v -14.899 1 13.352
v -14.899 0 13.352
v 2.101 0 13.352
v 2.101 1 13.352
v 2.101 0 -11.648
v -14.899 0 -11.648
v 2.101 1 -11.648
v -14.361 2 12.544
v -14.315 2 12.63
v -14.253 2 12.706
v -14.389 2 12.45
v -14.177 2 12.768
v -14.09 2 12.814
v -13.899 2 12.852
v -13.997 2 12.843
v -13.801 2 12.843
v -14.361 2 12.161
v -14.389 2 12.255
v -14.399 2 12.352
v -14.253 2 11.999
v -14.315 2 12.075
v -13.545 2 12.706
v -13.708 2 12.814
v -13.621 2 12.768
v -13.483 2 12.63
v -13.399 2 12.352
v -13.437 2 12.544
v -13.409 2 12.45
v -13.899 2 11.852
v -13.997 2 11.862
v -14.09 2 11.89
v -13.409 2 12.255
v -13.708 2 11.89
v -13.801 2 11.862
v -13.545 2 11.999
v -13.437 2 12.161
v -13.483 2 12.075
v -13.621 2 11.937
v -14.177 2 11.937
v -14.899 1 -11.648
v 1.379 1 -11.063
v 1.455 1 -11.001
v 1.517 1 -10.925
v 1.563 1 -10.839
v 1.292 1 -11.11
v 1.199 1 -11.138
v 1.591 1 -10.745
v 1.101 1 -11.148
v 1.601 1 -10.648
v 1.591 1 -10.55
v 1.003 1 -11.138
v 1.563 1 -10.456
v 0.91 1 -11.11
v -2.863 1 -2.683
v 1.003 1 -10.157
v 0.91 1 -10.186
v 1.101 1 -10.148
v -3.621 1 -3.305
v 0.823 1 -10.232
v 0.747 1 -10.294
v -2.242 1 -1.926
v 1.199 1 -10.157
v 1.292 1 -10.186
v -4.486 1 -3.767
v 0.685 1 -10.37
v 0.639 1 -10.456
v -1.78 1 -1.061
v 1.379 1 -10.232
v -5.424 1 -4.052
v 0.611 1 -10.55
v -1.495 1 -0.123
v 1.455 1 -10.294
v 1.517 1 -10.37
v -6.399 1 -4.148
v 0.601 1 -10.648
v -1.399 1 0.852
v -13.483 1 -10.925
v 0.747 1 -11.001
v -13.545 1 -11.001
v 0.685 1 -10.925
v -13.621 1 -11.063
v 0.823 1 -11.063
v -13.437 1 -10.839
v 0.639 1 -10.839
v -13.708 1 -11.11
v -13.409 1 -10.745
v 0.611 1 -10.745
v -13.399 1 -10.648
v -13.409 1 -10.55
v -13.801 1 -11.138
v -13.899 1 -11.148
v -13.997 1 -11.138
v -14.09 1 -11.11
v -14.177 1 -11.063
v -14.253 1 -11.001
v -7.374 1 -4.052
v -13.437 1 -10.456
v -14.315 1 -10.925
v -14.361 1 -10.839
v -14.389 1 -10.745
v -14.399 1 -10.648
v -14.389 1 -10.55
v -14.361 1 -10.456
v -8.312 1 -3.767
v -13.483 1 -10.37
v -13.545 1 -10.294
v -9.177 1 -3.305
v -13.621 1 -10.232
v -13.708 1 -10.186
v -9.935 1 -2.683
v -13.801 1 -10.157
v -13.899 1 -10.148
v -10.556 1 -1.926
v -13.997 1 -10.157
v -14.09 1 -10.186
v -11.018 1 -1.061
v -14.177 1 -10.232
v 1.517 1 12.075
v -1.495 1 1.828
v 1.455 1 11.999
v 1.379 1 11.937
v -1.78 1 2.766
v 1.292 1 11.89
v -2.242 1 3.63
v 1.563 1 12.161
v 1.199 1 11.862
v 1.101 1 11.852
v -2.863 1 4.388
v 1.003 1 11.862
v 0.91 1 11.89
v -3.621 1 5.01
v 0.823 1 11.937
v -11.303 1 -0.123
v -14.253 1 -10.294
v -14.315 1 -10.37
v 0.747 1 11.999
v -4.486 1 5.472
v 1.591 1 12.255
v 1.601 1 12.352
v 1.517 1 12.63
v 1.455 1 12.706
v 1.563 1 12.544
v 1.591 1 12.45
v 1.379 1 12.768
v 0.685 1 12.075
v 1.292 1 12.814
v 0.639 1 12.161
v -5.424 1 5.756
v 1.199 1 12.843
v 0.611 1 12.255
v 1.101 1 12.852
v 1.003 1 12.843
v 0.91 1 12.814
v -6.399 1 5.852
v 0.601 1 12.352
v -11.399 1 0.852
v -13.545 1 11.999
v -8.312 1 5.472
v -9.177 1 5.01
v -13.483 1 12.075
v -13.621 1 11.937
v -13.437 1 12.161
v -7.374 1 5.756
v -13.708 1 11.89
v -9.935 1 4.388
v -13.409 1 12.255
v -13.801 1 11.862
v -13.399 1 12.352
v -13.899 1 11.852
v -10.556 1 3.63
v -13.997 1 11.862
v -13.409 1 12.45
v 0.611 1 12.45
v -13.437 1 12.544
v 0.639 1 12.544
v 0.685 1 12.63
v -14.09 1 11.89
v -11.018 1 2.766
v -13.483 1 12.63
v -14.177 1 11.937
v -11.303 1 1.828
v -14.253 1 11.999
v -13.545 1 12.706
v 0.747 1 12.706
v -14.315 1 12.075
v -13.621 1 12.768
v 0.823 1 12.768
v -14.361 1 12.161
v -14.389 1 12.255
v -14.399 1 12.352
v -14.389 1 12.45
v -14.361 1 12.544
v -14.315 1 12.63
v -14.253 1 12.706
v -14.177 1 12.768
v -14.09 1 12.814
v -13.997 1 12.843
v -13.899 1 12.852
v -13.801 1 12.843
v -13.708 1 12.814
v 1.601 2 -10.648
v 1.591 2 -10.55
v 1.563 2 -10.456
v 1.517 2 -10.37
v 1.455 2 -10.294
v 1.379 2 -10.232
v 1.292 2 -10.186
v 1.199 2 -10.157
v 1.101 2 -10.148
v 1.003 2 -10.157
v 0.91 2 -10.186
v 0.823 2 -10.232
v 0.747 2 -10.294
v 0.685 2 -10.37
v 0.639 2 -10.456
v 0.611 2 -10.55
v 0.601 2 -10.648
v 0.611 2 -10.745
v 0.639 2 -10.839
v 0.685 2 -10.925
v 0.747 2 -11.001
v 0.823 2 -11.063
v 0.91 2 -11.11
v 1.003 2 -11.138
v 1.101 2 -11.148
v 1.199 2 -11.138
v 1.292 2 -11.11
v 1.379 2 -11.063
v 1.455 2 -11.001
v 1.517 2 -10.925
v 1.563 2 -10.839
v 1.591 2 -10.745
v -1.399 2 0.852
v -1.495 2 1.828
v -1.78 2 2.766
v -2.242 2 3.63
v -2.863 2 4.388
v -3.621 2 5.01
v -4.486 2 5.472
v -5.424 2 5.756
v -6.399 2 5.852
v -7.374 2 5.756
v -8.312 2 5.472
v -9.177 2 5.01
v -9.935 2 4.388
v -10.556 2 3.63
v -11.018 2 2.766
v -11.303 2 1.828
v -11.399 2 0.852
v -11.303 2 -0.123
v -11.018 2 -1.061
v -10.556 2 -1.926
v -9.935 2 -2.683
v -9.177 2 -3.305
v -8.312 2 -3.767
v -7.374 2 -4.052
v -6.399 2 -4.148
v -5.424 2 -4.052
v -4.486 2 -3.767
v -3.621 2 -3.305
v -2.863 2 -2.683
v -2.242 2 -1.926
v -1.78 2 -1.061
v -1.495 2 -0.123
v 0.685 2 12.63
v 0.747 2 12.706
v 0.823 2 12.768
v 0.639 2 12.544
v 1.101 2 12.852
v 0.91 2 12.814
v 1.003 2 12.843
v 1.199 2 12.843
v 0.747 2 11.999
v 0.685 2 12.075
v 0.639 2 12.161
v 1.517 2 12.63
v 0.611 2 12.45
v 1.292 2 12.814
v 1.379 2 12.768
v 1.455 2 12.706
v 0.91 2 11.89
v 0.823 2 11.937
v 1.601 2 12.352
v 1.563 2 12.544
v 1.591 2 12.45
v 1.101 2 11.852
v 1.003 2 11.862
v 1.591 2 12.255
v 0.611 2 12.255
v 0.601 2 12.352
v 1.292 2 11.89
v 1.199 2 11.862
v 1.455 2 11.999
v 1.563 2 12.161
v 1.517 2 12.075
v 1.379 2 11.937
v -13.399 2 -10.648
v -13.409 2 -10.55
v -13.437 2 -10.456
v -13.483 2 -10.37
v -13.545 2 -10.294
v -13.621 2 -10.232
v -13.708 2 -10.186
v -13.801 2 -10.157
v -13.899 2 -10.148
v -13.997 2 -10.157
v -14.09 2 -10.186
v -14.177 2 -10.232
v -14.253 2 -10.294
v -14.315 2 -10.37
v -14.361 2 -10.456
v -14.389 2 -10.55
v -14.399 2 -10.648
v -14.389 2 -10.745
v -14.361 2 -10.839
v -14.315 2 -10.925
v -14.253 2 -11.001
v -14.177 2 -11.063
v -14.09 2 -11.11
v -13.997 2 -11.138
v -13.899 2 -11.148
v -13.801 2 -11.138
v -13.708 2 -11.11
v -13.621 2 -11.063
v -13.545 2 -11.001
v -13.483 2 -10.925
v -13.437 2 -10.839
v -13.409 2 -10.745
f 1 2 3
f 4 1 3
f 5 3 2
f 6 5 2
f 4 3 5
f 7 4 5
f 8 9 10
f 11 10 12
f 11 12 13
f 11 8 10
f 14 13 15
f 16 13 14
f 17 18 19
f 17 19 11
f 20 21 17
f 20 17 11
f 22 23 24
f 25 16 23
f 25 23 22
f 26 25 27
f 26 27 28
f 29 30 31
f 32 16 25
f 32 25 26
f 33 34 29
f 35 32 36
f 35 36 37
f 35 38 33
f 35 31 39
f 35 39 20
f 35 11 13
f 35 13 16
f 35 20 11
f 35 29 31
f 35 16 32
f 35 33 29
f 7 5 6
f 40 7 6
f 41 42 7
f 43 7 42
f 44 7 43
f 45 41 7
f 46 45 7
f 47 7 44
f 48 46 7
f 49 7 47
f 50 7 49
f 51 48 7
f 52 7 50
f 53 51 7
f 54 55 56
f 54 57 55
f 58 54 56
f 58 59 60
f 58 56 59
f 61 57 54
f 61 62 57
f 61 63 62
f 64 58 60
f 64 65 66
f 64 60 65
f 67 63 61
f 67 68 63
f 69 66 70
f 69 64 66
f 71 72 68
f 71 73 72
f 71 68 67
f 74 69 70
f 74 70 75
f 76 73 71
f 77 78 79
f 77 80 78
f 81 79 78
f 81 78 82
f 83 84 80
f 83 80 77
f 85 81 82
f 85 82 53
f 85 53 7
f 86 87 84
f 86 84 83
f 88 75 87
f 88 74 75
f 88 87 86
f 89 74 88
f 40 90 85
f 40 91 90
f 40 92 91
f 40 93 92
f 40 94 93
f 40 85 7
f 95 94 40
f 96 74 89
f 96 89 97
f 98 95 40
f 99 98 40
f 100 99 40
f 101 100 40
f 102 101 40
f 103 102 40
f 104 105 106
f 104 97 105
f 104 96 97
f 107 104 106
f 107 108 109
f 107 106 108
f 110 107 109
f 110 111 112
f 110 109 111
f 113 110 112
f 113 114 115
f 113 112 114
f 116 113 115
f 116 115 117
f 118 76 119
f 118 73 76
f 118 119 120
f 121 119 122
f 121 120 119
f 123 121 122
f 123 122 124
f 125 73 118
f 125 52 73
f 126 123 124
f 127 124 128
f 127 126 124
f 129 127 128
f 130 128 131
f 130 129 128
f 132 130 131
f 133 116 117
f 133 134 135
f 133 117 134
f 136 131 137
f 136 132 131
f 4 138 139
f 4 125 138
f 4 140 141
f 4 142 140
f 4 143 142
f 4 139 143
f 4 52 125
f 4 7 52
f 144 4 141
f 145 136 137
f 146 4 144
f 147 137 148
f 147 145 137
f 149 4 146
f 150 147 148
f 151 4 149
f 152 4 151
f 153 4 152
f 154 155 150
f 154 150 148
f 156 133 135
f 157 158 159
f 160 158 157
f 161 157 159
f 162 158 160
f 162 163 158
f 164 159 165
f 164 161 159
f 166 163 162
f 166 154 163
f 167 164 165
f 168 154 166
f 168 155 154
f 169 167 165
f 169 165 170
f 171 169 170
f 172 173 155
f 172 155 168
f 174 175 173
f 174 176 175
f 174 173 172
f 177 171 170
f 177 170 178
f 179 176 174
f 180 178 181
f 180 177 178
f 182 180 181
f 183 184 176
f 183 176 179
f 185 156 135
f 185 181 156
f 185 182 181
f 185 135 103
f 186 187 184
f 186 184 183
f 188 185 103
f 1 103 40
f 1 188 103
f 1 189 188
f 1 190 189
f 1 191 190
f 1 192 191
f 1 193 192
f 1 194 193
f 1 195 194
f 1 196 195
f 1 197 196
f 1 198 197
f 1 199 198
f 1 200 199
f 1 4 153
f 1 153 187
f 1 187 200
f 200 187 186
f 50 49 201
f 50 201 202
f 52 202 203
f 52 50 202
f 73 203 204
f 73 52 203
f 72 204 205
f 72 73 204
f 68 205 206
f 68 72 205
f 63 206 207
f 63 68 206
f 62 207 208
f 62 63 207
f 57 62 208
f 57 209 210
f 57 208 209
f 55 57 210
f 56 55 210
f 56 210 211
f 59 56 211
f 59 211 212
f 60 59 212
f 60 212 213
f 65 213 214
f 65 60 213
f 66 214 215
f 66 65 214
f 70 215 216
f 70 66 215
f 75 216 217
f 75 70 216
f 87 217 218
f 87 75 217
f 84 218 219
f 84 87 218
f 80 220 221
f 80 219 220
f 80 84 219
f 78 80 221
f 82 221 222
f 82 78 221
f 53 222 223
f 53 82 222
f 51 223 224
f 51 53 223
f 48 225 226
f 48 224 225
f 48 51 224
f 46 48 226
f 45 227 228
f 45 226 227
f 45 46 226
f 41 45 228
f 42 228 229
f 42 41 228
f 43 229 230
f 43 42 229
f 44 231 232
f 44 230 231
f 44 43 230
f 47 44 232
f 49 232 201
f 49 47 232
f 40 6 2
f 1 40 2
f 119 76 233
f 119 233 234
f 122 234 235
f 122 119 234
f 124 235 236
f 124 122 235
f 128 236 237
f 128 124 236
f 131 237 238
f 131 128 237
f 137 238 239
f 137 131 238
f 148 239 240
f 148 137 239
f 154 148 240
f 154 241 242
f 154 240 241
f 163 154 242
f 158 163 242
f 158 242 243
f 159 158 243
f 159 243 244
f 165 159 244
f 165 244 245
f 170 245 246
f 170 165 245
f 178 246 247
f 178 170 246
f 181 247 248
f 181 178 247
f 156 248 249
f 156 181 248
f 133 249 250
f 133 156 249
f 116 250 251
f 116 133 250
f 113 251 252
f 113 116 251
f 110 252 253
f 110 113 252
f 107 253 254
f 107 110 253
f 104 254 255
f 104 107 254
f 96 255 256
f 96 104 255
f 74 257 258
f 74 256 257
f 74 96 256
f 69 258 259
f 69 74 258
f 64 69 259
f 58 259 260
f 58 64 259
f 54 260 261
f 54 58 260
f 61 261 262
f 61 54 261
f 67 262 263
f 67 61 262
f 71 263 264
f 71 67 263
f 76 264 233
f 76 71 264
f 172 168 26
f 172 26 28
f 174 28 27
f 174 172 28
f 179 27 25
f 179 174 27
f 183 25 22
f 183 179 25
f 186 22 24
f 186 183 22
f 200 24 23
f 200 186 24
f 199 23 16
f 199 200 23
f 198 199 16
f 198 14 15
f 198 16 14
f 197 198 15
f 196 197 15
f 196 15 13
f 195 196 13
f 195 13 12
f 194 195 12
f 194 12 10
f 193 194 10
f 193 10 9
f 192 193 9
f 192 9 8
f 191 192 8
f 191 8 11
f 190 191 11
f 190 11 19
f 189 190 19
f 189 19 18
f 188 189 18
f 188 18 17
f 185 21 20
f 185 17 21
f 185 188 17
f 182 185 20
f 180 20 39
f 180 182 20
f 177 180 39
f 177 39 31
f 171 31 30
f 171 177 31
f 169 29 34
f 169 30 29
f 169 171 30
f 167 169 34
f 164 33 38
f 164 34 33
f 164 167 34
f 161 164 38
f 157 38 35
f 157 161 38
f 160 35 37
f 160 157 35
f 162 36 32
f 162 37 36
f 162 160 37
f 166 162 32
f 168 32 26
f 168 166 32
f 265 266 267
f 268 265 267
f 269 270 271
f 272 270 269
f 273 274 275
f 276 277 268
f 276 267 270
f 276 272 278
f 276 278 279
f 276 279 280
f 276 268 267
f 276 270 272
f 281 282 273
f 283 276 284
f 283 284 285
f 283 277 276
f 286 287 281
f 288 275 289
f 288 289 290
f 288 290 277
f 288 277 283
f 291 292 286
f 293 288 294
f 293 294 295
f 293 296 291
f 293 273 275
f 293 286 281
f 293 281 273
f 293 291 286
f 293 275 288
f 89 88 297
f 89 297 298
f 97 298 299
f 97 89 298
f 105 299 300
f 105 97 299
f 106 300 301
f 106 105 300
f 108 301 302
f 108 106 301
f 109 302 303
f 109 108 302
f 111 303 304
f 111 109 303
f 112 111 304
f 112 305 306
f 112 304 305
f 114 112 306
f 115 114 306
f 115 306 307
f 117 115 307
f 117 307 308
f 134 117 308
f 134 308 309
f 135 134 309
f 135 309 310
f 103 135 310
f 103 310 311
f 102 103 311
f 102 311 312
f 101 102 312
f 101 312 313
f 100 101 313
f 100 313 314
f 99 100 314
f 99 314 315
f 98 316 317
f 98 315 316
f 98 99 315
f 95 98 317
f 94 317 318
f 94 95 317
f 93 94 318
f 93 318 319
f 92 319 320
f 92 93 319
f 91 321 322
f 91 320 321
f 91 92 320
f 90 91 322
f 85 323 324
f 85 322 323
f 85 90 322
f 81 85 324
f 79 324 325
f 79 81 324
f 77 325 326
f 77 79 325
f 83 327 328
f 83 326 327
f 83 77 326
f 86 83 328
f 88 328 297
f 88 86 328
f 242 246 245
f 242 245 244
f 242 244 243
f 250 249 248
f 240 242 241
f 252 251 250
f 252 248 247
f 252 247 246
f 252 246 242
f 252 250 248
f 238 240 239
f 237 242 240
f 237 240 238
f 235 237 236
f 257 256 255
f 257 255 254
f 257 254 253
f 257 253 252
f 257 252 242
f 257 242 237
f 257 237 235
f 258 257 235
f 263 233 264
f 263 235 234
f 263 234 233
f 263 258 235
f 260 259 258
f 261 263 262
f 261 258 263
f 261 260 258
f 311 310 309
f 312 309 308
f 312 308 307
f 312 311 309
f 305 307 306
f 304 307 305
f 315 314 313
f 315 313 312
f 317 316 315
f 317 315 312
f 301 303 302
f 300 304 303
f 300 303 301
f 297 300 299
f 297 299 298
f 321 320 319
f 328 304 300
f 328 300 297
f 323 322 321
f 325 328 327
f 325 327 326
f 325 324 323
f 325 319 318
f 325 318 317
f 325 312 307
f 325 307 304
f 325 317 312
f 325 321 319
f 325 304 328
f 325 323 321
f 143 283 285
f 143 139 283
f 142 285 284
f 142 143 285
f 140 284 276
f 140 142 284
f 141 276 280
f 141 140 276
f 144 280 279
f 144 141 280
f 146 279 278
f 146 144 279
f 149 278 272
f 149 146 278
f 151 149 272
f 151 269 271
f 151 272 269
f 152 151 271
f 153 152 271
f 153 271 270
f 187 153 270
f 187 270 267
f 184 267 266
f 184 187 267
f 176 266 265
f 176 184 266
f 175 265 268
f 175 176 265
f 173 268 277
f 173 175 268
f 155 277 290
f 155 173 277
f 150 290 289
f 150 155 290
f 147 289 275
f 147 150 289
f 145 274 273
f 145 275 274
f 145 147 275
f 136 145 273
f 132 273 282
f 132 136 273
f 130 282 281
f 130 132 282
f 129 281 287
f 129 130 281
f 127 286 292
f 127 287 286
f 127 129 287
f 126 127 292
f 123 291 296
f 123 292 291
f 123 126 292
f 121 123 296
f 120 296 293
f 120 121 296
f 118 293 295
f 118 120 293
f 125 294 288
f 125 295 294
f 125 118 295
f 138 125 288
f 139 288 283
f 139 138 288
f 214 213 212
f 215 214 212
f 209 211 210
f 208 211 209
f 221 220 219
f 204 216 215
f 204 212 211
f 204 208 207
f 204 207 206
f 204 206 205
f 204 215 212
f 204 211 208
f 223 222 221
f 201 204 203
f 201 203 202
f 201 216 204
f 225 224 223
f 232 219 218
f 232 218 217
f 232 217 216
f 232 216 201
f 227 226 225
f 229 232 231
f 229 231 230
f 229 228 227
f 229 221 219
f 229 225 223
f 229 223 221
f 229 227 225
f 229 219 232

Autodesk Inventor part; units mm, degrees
ref_plane "YZ Plane" through (0, 0, 0) normal (1, 0, 0) x (0, 1, 0)
ref_plane "XZ Plane" through (0, 0, 0) normal (0, 1, 0) x (-1, 0, 0)
ref_plane "XY Plane" through (0, 0, 0) normal (0, 0, 1) x (1, 0, 0)
sketch "Эскиз1" plane through (0, 0, 0) normal (0, 1, 0) x (-1, 0, 0)
  line L0 (14.899, 13.3523) -> (-2.101, 13.3523)
  line L1 (-2.101, 13.3523) -> (-2.101, -11.6477)
  line L2 (-2.101, -11.6477) -> (14.899, -11.6477)
  line L3 (14.899, -11.6477) -> (14.899, 13.3523)
  point P0 (0, 0)
  dimension "d0" = 25
  dimension "d1" = 17
extrude "Выдавливание1" add sketch "Эскиз1" along normal blind 1
sketch "Эскиз2" plane through (0, 1, 0) normal (0, 1, 0) x (1, 0, 0)
  line L0 (-14.899, 11.6477) -> (-14.899, -13.3523) construction
  line L1 (2.101, -13.3523) -> (2.101, 11.6477) construction
  line L2 (-14.899, -13.3523) -> (2.101, 11.6477) construction
  line L3 (2.101, 11.6477) -> (-14.899, 11.6477) construction
  line L4 (-14.899, 11.6477) -> (2.101, -13.3523) construction
  line L5 (-13.899, -12.3523) -> (1.101, -12.3523) construction
  line L6 (1.101, -12.3523) -> (1.101, 10.6477) construction
  line L7 (1.101, 10.6477) -> (-13.899, 10.6477) construction
  line L8 (-13.899, 10.6477) -> (-13.899, -12.3523) construction
  line L9 (-13.899, -12.3523) -> (1.101, 10.6477) construction
  line L10 (1.101, -12.3523) -> (-13.899, 10.6477) construction
  circle A0 centre (-13.899, -12.3523) radius 0.5
  circle A1 centre (-13.899, 10.6477) radius 0.5
  circle A2 centre (1.101, 10.6477) radius 0.5
  circle A3 centre (1.101, -12.3523) radius 0.5
  circle A4 centre (-6.399, -0.8523) radius 5
  point P0 (0, 0)
  point P1 (-6.399, -0.8523)
  dimension "d4" = 23
  dimension "d5" = 15
  dimension "d6" = 1
  dimension "d7" = 10
extrude "Выдавливание2" add sketch "Эскиз2" along normal blind 1
properties part number "тест"
